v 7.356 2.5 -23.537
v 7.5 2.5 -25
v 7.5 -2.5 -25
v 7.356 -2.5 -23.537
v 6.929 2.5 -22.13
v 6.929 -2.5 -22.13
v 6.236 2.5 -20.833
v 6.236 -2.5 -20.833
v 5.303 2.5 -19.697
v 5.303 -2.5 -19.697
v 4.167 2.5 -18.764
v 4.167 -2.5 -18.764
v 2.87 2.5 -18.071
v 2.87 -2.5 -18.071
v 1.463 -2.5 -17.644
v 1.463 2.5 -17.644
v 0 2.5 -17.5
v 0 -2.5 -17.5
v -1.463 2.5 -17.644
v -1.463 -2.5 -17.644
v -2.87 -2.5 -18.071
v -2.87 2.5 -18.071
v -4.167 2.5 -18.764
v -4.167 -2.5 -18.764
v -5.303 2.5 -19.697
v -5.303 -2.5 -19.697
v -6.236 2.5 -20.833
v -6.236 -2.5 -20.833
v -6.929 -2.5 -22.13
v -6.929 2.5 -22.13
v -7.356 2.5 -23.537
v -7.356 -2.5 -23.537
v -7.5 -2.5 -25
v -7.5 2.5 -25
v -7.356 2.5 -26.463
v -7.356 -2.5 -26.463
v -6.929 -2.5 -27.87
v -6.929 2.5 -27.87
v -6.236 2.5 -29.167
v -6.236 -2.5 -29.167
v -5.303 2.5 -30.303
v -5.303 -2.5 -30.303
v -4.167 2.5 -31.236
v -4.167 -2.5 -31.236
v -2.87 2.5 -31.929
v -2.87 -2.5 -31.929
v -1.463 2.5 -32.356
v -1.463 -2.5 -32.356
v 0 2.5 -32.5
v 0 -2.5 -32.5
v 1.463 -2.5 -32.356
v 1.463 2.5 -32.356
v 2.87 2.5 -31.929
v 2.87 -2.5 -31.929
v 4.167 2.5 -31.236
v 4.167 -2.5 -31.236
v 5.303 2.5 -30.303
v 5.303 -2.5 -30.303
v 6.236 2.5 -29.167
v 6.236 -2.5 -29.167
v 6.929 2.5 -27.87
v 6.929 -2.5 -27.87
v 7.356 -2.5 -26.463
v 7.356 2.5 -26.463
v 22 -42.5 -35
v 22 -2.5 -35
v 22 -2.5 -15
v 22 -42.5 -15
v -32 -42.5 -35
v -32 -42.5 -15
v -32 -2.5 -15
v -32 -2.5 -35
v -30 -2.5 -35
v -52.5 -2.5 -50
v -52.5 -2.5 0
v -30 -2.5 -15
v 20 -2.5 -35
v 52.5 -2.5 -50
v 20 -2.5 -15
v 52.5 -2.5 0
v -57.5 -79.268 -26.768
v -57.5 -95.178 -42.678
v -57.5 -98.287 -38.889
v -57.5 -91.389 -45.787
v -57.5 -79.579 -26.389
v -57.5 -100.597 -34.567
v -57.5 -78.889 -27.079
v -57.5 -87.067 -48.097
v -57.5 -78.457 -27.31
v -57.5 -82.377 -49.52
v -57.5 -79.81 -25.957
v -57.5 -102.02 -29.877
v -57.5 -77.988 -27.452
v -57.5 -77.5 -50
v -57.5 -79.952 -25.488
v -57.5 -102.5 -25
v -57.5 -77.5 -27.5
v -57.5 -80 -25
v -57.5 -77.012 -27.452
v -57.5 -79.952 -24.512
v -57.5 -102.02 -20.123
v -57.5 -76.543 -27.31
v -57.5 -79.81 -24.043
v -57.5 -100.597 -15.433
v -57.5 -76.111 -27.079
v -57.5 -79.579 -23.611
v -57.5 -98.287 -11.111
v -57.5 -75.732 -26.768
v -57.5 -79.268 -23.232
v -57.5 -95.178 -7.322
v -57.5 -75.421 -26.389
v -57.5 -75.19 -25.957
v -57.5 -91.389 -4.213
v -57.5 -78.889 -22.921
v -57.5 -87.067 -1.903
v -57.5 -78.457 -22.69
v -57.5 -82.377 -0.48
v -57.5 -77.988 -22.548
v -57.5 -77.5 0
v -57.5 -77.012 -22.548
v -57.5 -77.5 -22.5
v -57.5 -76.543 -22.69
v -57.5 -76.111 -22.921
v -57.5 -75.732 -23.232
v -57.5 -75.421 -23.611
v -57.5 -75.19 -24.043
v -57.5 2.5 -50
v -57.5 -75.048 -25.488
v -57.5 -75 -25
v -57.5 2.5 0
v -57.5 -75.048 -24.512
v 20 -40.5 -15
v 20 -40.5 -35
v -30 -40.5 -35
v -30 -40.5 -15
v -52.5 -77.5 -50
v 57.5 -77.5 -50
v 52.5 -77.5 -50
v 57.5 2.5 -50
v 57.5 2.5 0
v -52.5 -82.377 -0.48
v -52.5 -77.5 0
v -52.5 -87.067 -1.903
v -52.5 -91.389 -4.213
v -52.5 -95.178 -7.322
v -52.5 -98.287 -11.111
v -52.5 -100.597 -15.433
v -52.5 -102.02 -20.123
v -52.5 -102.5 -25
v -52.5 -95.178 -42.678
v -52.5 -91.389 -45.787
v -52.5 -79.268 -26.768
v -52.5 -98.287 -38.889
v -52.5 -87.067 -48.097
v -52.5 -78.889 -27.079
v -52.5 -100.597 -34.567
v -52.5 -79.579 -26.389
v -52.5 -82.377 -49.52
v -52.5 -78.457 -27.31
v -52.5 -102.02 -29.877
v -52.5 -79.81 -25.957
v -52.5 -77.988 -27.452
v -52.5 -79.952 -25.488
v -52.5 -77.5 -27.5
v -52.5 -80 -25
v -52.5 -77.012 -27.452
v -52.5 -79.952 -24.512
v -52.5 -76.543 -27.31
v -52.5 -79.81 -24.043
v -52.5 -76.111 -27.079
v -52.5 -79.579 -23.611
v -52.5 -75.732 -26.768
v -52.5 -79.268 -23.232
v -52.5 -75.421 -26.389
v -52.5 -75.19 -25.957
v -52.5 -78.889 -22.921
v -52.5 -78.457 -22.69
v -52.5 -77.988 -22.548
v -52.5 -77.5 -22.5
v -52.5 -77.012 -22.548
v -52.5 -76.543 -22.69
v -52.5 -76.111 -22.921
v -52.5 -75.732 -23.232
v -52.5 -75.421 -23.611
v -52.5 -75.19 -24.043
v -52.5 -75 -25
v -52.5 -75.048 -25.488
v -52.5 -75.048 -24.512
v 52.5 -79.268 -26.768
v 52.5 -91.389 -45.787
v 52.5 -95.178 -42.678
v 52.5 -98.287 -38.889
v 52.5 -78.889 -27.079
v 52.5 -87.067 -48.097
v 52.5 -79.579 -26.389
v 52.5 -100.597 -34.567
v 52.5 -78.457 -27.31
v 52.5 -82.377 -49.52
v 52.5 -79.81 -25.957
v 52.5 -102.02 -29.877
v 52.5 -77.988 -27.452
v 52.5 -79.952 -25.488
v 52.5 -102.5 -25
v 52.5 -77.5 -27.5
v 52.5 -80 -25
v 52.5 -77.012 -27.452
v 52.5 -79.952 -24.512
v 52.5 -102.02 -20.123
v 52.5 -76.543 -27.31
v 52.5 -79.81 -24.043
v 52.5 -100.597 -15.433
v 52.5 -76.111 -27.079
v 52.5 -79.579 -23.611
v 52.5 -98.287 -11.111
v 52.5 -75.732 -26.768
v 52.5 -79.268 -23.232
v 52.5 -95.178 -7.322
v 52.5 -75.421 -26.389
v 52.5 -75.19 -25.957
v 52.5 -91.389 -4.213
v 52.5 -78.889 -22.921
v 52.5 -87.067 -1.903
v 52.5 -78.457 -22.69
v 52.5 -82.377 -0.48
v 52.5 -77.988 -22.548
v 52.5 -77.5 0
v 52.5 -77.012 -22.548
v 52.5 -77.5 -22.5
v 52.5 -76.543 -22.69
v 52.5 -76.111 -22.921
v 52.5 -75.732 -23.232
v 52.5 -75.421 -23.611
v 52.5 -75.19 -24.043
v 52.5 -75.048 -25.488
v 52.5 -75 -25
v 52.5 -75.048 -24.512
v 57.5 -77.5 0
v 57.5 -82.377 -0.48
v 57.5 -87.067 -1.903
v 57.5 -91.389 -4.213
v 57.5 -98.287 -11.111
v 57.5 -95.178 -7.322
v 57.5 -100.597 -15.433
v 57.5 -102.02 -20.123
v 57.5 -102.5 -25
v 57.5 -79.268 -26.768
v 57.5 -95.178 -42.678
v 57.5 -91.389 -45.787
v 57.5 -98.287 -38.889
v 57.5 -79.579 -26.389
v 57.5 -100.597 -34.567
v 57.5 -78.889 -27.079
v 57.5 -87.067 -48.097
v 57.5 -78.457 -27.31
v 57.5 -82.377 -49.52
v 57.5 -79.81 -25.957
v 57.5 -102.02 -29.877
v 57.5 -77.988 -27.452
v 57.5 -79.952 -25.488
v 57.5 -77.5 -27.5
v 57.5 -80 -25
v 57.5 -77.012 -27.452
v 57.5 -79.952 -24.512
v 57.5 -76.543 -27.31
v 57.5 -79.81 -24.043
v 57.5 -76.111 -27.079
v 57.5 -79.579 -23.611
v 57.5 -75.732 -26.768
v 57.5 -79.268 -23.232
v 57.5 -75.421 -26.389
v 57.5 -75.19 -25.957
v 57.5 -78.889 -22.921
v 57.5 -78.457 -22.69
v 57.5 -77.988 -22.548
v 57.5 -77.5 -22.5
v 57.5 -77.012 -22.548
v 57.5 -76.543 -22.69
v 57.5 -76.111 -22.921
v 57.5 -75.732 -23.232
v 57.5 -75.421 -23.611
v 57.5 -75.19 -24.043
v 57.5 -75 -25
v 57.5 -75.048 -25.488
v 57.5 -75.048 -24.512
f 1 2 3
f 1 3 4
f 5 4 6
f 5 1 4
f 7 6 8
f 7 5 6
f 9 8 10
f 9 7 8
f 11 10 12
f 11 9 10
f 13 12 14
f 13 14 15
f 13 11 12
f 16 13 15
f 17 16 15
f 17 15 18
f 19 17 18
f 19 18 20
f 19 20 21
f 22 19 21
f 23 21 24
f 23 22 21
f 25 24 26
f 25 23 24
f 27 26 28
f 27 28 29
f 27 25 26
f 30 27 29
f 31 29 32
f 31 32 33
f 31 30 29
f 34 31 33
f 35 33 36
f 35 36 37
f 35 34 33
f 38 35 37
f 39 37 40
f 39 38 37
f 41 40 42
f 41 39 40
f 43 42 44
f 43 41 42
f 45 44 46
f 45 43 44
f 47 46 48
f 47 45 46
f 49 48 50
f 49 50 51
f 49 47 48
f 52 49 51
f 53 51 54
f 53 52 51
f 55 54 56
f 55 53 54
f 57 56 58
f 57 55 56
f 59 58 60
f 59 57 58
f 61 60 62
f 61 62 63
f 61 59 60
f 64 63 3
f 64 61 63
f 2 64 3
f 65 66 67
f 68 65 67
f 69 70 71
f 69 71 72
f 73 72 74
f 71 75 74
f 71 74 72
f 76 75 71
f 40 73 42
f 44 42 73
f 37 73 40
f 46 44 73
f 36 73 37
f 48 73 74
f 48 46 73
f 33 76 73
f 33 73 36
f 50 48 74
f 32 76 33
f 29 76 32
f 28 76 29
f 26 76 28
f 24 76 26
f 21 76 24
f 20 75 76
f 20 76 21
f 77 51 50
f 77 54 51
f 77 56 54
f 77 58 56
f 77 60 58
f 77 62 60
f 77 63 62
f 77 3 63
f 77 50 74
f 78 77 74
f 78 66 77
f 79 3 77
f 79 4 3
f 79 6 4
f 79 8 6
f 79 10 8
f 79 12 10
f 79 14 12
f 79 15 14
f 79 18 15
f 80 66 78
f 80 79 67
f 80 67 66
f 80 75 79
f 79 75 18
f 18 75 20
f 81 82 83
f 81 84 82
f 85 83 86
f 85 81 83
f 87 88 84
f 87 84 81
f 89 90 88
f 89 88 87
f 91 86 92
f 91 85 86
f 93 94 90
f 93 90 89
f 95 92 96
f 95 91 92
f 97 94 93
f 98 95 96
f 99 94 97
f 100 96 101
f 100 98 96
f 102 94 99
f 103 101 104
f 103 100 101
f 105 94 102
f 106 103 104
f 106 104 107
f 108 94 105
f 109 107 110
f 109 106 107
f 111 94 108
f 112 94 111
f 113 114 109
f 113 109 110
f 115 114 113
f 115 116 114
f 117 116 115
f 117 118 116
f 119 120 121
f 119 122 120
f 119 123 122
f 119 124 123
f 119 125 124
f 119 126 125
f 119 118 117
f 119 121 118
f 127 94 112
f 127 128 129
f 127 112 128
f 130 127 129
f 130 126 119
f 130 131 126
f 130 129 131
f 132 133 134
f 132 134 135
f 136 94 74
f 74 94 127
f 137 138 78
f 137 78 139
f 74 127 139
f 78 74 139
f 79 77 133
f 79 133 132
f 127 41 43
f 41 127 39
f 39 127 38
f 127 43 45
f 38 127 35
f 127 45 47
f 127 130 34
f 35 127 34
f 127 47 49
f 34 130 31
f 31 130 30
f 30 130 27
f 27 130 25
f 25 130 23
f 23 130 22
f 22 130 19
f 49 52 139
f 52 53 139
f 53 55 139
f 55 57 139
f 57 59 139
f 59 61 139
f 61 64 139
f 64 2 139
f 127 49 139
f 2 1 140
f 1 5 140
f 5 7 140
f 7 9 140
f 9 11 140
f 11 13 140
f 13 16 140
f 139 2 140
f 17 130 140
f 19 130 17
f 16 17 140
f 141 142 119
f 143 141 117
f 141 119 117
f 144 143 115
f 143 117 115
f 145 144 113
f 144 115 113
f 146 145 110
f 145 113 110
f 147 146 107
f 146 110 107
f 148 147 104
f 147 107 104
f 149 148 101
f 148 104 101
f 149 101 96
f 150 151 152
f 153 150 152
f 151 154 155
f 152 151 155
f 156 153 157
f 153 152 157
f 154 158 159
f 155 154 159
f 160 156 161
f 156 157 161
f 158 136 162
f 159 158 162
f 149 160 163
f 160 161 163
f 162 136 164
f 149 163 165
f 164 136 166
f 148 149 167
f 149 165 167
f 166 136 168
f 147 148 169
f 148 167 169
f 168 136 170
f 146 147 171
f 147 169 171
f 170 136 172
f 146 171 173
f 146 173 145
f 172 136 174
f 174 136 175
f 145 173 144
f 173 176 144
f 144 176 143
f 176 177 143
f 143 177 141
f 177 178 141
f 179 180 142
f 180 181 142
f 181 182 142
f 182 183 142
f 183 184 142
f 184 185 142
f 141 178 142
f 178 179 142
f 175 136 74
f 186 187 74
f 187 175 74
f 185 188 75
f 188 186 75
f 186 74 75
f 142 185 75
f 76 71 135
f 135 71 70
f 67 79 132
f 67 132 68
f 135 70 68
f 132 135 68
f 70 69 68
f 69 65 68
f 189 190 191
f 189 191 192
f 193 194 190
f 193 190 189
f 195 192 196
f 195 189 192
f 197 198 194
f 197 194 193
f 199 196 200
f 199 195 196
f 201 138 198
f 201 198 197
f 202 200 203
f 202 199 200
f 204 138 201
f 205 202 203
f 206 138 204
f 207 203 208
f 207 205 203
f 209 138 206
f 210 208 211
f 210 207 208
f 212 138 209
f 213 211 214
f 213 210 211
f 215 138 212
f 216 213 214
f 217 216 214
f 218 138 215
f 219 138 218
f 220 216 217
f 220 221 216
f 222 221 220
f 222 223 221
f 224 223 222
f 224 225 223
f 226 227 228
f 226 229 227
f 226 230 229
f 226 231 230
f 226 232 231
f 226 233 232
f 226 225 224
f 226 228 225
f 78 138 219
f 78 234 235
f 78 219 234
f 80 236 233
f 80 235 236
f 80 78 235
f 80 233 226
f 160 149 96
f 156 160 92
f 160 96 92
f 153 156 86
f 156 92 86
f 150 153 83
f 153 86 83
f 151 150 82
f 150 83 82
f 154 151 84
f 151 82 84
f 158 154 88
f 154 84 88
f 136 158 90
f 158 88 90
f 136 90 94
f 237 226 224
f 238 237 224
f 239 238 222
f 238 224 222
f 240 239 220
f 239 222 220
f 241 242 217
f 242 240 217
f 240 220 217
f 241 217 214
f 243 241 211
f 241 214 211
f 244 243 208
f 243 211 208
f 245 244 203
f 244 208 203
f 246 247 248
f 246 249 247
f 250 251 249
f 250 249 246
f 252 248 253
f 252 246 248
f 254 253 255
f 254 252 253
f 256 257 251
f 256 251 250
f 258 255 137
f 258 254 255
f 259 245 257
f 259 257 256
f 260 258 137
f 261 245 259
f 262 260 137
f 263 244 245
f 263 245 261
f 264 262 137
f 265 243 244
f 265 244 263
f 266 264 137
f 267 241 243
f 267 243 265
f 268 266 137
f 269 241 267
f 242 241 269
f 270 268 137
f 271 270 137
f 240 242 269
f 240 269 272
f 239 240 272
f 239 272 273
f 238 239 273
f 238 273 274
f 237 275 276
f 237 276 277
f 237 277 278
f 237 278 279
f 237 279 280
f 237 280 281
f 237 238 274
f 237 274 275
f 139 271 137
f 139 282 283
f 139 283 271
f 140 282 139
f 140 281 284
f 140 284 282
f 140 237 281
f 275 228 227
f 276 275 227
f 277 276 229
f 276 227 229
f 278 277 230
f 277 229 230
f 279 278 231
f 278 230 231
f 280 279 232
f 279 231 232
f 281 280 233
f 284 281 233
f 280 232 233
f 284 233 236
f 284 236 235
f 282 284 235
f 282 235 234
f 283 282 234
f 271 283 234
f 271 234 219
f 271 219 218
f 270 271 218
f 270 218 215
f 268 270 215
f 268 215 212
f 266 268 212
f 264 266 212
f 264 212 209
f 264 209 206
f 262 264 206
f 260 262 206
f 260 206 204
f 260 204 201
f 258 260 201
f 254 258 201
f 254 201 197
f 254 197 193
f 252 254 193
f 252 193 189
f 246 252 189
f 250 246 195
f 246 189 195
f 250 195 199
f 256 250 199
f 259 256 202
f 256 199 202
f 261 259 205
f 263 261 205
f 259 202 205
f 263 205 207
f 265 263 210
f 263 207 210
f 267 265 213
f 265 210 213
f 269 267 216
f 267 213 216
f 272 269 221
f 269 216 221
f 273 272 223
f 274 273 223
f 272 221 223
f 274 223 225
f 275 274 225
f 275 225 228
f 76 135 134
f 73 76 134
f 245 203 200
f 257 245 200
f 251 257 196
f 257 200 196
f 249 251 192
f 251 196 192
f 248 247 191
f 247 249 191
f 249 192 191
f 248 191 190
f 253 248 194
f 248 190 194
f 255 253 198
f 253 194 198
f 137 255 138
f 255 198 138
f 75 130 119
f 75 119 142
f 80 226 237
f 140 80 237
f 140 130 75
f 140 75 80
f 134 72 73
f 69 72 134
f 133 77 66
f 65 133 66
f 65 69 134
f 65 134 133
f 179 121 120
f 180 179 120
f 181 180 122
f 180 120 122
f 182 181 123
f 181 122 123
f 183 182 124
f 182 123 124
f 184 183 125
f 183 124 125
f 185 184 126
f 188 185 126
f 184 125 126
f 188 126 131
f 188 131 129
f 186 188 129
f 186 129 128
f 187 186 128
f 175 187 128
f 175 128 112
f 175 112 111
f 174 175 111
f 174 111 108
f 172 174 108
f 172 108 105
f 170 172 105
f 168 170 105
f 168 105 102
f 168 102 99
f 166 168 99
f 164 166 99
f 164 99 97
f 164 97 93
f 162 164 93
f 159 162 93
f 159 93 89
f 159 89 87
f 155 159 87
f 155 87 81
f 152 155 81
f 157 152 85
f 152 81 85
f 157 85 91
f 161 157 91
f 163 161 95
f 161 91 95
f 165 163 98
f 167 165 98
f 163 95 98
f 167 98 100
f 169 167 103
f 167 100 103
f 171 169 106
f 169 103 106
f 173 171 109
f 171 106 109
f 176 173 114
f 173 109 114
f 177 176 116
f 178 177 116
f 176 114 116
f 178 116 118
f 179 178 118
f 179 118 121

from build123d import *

# Parameters (mm, degrees)
SKETCH2_W              = 115
SKETCH2_H              = 5
BOSS_EXTRUDE1_DEPTH    = 50
SKETCH3_W              = 5
SKETCH3_H              = 50
BOSS_EXTRUDE2_DEPTH    = 100
CUT_EXTRUDE1_DEPTH     = 162.960643367
SKETCH5_R              = 2.5
CUT_EXTRUDE2_DEPTH     = 162.960643367
CUT_EXTRUDE3_START     = -5
CUT_EXTRUDE3_OUTLINE_R = 7.5
CUT_EXTRUDE3_DEPTH     = 5
SKETCH7_W              = 2
SKETCH7_H              = 20
BOSS_EXTRUDE3_DEPTH    = 40
SKETCH8_W              = 20
SKETCH8_H              = 2
BOSS_EXTRUDE4_DEPTH    = 52
BOSS_EXTRUDE6_REACH    = 100.236
SKETCH9_W              = 2
SKETCH9_H              = 20


# Read off the part's stored shape, not the designer's step: Cut-Extrude3
with BuildPart() as part:
    # Sketch2 → Boss-Extrude1 (new body)
    with BuildSketch(Plane.XY):
        Rectangle(SKETCH2_W, SKETCH2_H)
    extrude(amount=-BOSS_EXTRUDE1_DEPTH)

    # Sketch3 → Boss-Extrude2 (add)
    with BuildSketch(Plane.XZ.offset(2.5)):
        with Locations((-55, -25)):
            Rectangle(SKETCH3_W, SKETCH3_H)
        with Locations((55, -25)):
            Rectangle(SKETCH3_W, SKETCH3_H)
    extrude(amount=BOSS_EXTRUDE2_DEPTH)

    # Sketch4 → Cut-Extrude1 (cut, through all)
    with BuildSketch(Plane.ZY.offset(57.5)):
        with BuildLine():
            Line((0, -102.5), (0, -77.5))
            ThreePointArc((0, -77.5), (-7.32233047, -95.17766953), (-25, -102.5))
            Line((-25, -102.5), (0, -102.5))
        make_face()
        with BuildLine():
            ThreePointArc((-25, -102.5), (-42.67766953, -95.17766953), (-50, -77.5))
            Line((-50, -77.5), (-50, -102.5))
            Line((-50, -102.5), (-25, -102.5))
        make_face()
    extrude(amount=-CUT_EXTRUDE1_DEPTH, mode=Mode.SUBTRACT)

    # Sketch5 → Cut-Extrude2 (cut, through all)
    with BuildSketch(Plane.ZY.offset(57.5)):
        with Locations((-25, -77.5)):
            Circle(SKETCH5_R)
    extrude(amount=-CUT_EXTRUDE2_DEPTH, mode=Mode.SUBTRACT)

    # Cut-Extrude3 outline → Cut-Extrude3 (cut)
    with BuildSketch(Plane.XZ.offset(2.5).offset(CUT_EXTRUDE3_START)):
        with Locations((0, -25)):
            Circle(CUT_EXTRUDE3_OUTLINE_R)
    extrude(amount=CUT_EXTRUDE3_DEPTH, mode=Mode.SUBTRACT)

    # Sketch7 → Boss-Extrude3 (add)
    with BuildSketch(Plane.XZ.offset(2.5)):
        with Locations((21, -25)):
            Rectangle(SKETCH7_W, SKETCH7_H)
    extrude(amount=BOSS_EXTRUDE3_DEPTH)

    # Sketch8 → Boss-Extrude4 (add)
    with BuildSketch(Plane.ZY.offset(-20)):
        with Locations((-25, -41.5)):
            Rectangle(SKETCH8_W, SKETCH8_H)
    extrude(amount=BOSS_EXTRUDE4_DEPTH)

    # Sketch9 → Boss-Extrude6 (add, up to next)
    with BuildSketch(Plane(origin=(0, -40.5, 0), x_dir=(1, 0, 0), z_dir=(0, 1, 0)), mode=Mode.PRIVATE) as boss_extrude6_sk1:
        with Locations((-31, 25)):
            Rectangle(SKETCH9_W, SKETCH9_H)
    boss_extrude6_tool1 = extrude(boss_extrude6_sk1.sketch, amount=BOSS_EXTRUDE6_REACH, mode=Mode.PRIVATE) - part.part
    add(boss_extrude6_tool1.solids().sort_by_distance((-31, -40.5, -25))[0])


solid = part.part
